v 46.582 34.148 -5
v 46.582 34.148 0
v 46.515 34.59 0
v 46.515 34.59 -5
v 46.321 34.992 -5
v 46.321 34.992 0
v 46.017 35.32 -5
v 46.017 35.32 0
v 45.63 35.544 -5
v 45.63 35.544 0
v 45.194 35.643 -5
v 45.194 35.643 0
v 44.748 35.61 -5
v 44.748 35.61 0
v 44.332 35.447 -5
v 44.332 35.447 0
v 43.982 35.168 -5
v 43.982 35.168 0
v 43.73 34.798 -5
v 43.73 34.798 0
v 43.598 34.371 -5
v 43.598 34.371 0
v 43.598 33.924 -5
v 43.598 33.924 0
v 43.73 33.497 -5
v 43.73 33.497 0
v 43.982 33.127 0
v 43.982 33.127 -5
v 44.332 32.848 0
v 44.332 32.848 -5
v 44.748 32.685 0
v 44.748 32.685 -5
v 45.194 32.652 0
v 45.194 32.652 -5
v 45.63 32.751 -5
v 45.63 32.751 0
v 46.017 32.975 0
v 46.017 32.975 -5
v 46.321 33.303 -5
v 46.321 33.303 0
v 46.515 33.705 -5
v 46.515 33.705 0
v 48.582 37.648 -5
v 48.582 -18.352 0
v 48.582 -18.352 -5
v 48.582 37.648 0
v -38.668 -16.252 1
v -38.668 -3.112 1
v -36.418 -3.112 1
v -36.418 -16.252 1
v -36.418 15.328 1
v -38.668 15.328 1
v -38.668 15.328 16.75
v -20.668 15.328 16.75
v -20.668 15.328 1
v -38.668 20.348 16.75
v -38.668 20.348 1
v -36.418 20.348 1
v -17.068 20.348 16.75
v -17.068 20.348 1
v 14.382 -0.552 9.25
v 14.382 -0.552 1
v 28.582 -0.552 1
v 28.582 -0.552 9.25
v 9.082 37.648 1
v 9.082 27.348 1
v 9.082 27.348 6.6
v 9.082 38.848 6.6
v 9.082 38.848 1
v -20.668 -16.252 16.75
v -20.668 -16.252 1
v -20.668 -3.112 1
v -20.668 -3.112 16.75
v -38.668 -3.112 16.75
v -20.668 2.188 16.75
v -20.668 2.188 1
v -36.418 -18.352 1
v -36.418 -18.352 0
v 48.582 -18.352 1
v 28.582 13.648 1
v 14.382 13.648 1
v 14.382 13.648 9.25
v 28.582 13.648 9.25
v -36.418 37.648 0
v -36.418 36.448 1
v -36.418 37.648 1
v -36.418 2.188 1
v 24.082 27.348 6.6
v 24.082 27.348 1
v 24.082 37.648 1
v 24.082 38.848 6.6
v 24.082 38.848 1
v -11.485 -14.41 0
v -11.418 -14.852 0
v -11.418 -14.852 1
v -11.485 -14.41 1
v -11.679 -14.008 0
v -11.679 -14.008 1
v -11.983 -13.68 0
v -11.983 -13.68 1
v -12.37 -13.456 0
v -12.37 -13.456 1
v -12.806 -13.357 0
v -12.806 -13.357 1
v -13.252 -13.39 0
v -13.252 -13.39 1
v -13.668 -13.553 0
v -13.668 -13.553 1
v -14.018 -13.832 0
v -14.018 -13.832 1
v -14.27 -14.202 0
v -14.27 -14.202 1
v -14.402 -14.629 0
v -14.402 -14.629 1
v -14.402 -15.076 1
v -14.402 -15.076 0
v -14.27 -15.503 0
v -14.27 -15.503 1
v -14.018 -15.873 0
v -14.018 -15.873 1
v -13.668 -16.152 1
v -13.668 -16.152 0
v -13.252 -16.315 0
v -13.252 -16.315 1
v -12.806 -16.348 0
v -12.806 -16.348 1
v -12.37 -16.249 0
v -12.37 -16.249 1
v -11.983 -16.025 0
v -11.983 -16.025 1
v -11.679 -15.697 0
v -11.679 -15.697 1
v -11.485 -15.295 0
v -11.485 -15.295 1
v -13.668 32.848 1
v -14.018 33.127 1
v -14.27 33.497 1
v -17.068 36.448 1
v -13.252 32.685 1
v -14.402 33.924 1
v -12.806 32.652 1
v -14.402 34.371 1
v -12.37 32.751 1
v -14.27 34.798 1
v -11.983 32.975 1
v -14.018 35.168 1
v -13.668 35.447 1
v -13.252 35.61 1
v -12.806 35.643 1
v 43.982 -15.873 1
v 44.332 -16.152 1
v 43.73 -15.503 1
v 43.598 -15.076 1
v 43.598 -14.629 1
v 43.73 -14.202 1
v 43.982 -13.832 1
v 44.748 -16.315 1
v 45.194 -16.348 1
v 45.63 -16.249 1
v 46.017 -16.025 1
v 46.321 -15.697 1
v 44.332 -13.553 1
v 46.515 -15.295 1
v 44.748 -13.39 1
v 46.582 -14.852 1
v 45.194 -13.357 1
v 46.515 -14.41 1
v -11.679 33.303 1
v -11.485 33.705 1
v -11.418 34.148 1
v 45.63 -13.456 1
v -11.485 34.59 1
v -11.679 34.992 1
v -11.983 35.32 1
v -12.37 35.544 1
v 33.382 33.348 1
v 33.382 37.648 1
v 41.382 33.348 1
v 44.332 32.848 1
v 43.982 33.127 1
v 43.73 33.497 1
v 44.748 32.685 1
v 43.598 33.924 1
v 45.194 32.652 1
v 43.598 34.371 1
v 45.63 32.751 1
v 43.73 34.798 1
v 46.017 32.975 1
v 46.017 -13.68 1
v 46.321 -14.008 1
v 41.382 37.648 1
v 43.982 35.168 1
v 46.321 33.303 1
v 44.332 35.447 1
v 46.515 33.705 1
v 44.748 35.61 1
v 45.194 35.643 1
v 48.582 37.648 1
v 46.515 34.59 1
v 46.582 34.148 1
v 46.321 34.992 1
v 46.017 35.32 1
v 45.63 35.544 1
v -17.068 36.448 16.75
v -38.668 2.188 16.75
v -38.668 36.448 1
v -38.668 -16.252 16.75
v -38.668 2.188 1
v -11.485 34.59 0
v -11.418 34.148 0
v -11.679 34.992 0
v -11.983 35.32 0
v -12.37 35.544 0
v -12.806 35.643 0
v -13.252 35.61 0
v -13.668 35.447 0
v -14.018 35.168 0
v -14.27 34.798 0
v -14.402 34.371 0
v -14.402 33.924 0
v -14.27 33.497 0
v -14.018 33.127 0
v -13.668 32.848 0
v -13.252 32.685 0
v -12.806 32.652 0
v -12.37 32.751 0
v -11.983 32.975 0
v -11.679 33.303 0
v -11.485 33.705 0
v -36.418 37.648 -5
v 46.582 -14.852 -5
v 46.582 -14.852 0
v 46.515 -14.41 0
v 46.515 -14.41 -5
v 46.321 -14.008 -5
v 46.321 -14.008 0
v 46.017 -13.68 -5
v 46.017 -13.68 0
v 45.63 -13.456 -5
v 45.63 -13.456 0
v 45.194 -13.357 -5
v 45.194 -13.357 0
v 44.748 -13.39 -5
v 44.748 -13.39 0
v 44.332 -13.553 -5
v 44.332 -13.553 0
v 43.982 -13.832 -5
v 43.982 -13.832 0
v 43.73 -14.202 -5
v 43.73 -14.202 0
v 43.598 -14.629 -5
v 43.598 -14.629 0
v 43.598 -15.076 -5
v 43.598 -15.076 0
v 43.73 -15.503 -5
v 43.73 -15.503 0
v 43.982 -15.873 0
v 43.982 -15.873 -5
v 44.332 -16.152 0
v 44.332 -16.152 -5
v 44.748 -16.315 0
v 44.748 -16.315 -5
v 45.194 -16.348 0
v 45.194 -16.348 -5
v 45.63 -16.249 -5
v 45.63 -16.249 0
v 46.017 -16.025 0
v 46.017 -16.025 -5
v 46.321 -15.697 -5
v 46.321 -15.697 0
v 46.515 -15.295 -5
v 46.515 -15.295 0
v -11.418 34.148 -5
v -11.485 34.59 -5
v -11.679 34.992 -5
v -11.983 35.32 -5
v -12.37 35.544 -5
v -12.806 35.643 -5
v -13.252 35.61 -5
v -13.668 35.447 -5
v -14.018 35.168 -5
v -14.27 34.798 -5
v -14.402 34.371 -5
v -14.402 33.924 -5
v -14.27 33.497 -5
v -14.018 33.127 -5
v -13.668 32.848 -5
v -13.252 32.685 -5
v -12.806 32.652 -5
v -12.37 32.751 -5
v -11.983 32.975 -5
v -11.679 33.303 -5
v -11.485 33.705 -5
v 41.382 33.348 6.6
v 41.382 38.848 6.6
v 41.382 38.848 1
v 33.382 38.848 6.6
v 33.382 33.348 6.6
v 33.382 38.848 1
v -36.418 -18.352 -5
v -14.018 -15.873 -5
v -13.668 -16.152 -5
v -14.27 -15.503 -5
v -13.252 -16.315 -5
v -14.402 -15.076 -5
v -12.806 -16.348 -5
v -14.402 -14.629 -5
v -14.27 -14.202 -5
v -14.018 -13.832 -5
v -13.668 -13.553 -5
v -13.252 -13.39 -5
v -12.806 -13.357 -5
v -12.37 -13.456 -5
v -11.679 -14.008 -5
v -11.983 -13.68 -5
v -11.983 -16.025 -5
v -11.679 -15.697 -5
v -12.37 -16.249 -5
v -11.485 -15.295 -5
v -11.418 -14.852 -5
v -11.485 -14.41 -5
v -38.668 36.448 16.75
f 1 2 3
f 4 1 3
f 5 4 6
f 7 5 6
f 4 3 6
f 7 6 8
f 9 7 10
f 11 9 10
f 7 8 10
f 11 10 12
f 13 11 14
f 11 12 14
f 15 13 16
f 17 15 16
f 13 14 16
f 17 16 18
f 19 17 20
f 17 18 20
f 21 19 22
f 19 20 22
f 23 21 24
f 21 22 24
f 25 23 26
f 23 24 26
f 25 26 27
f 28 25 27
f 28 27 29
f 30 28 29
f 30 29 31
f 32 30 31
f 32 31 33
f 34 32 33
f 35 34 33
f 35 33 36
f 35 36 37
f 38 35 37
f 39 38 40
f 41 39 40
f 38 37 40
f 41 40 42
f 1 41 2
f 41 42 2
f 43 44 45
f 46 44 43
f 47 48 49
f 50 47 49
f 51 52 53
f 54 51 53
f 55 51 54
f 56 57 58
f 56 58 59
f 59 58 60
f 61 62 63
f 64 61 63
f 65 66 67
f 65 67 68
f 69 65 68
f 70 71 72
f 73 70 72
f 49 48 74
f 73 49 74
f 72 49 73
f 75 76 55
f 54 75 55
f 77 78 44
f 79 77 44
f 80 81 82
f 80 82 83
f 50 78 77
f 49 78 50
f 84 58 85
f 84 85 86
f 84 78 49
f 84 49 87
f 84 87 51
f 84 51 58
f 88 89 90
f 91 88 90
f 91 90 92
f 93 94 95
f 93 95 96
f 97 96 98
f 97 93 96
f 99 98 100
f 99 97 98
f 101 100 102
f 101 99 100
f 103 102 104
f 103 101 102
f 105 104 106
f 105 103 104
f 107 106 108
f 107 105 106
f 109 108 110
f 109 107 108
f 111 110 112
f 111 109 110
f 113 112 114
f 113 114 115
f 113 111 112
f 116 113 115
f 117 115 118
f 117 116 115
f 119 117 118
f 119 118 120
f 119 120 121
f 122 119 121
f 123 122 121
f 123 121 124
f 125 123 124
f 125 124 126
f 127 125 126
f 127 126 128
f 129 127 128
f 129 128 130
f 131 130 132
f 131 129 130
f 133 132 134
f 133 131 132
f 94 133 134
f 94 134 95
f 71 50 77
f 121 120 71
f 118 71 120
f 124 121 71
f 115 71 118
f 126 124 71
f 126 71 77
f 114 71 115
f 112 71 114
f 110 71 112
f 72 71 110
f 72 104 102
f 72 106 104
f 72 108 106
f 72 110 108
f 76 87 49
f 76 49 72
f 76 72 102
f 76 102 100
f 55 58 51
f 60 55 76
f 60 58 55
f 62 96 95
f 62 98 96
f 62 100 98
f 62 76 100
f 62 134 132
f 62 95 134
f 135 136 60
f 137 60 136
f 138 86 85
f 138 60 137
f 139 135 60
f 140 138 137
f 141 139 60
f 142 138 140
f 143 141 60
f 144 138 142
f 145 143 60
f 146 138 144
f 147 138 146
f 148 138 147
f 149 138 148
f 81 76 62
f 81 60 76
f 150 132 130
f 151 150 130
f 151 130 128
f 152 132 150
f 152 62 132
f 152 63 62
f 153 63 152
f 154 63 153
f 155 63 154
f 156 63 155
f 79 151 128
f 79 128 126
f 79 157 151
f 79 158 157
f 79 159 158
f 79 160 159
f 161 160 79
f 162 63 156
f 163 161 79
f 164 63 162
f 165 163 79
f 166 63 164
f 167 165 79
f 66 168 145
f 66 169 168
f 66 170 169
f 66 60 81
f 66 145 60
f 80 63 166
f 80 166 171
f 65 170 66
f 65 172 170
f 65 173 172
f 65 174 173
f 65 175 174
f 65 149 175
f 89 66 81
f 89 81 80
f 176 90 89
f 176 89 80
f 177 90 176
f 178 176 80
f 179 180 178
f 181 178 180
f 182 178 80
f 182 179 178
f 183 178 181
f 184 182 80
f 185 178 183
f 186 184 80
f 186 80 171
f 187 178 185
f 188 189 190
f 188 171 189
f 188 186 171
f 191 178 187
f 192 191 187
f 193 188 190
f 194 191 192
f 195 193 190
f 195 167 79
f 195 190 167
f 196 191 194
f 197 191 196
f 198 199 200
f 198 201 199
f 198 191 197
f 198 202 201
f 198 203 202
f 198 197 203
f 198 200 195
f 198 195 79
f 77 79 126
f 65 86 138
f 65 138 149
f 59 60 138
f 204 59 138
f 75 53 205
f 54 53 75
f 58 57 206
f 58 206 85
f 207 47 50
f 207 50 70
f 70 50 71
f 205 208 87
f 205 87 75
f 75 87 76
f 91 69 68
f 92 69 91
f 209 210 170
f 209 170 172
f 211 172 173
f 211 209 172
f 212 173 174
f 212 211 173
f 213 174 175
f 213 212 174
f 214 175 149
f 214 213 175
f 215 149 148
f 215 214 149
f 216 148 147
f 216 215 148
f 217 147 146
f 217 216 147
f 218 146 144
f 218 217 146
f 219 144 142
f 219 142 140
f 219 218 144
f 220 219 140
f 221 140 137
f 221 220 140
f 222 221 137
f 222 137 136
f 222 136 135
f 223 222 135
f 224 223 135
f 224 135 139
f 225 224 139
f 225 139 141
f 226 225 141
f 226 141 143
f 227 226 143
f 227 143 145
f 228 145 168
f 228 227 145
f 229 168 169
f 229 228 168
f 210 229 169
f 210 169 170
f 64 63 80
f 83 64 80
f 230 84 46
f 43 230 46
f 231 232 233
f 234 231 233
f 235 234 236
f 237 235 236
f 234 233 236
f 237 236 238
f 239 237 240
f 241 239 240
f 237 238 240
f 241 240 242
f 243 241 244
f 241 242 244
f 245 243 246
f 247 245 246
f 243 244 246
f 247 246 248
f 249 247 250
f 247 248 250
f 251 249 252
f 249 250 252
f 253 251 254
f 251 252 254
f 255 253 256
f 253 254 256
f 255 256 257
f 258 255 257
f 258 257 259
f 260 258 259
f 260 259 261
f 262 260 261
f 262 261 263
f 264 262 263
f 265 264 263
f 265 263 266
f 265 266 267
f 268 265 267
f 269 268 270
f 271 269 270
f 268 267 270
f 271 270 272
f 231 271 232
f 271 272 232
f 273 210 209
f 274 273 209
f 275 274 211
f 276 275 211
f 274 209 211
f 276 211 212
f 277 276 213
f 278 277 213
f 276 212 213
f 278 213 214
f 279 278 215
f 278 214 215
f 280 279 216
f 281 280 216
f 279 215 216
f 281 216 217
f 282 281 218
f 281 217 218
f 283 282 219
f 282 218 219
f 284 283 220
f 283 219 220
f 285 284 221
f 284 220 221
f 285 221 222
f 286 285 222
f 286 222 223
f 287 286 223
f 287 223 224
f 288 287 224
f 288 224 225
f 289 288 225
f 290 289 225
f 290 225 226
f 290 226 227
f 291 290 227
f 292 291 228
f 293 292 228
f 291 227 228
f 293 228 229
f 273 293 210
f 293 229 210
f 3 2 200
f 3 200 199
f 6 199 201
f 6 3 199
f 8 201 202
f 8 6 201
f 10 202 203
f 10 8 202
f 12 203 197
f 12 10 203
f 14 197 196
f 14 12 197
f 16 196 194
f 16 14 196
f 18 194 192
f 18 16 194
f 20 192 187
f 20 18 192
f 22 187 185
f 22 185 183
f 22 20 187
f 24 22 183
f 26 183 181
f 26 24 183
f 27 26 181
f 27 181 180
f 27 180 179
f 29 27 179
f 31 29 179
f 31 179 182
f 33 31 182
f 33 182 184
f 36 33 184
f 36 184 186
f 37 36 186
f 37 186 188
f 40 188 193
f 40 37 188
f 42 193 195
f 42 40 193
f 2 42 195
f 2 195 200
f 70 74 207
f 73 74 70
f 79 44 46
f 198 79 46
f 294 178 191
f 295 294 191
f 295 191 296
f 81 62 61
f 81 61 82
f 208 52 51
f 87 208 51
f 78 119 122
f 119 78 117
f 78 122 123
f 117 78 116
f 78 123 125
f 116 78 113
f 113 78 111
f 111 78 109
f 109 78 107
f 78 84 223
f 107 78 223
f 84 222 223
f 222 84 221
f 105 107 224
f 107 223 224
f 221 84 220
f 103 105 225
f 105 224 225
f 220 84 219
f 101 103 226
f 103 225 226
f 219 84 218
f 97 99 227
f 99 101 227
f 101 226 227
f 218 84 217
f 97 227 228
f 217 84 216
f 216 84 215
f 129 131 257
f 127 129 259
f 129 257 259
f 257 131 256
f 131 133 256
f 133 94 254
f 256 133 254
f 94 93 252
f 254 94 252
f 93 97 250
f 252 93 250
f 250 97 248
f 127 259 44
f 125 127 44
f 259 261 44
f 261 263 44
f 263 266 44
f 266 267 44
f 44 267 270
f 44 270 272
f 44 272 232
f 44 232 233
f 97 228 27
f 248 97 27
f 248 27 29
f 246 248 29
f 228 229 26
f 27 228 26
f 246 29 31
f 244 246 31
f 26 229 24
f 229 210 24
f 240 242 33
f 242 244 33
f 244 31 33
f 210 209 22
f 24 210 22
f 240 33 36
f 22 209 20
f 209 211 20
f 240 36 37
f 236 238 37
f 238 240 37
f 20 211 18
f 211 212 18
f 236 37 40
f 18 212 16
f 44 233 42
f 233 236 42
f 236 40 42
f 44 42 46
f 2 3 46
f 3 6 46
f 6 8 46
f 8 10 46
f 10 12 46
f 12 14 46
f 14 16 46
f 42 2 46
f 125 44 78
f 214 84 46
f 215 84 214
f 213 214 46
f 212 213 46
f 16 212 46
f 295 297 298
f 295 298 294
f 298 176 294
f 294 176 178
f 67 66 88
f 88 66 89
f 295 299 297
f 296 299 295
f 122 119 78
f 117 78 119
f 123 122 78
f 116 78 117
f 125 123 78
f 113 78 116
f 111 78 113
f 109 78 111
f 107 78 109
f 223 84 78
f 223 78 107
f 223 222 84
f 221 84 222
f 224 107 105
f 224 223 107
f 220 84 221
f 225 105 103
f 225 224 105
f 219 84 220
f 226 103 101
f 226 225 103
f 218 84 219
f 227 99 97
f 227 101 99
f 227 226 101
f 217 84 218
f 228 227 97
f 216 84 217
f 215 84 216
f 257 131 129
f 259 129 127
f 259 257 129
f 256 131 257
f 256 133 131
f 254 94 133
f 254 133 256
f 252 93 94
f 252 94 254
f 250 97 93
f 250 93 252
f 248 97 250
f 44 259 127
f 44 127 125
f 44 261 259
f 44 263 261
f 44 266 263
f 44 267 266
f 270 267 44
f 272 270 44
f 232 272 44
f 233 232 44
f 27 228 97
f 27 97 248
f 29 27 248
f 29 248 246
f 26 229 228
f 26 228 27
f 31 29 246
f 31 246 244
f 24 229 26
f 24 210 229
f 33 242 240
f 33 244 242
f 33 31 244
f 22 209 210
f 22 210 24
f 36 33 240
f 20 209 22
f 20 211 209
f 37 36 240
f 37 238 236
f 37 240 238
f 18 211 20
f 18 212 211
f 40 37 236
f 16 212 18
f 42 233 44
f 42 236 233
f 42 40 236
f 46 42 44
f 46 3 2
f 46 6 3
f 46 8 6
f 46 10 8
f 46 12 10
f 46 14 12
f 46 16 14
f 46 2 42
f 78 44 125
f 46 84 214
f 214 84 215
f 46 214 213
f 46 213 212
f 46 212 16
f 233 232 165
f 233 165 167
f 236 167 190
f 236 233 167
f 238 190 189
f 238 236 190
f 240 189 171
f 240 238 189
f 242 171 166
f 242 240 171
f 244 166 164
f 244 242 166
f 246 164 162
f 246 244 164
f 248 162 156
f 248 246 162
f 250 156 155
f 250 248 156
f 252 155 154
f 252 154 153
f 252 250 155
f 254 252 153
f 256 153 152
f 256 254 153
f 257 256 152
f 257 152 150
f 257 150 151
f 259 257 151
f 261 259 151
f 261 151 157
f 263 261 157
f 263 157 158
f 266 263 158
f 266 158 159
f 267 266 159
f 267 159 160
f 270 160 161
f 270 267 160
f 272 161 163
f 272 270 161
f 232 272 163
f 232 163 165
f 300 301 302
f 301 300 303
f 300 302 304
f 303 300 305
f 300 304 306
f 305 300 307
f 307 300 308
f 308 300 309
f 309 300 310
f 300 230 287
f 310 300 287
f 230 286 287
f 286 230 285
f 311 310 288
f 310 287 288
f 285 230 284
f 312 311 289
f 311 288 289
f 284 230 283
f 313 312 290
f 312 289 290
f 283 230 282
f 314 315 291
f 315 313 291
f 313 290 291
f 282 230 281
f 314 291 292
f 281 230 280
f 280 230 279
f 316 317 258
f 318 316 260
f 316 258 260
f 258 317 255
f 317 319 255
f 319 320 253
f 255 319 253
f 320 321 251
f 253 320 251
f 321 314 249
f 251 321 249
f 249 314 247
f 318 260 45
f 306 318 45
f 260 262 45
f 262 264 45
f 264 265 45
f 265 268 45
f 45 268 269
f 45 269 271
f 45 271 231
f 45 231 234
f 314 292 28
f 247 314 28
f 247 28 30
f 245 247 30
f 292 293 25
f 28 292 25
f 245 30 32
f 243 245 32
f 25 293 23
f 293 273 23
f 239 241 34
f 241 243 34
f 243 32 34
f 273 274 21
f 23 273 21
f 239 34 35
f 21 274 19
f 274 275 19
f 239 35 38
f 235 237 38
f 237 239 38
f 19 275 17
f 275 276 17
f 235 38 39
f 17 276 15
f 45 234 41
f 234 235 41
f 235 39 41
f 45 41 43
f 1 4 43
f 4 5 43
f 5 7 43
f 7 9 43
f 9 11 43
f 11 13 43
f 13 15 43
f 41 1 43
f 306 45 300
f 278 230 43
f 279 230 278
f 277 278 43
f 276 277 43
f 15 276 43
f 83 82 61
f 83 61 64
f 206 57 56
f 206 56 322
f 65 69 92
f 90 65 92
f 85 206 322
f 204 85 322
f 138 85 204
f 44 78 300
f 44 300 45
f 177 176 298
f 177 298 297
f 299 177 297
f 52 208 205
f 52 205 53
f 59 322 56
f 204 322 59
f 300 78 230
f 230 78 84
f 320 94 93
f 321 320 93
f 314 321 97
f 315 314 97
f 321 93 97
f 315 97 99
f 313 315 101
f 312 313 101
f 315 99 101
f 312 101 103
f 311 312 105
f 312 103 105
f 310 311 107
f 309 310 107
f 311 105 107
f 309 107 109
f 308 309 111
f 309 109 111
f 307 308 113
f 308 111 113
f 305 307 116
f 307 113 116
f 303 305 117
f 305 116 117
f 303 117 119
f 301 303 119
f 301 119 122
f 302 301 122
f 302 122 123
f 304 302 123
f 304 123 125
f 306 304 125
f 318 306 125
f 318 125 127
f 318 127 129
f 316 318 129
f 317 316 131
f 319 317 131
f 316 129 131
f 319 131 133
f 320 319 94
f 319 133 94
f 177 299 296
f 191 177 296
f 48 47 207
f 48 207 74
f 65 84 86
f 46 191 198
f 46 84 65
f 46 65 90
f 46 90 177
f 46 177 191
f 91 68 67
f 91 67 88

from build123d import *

# Parameters (mm, degrees)
SKETCH1_W           = 85
SKETCH1_H           = 56
SKETCH1_R           = 1.5
BOSS_EXTRUDE1_DEPTH = 1
SKETCH1_2_W         = 85
SKETCH1_2_H         = 56
SKETCH1_2_R         = 1.5
BOSS_EXTRUDE2_DEPTH = 5
SKETCH3_W           = 14.2
SKETCH3_H           = 14.2
BOSS_EXTRUDE3_DEPTH = 8.25
SKETCH4_W           = 18
SKETCH4_H           = 13.14
SKETCH4_W_2         = 21.6
SKETCH4_H_2         = 16.1
BOSS_EXTRUDE4_DEPTH = 15.75
SKETCH5_W           = 15
SKETCH5_H           = 11.5
SKETCH5_W_2         = 8
SKETCH5_H_2         = 5.5
BOSS_EXTRUDE5_DEPTH = 5.6


with BuildPart() as part:
    # Sketch1 → Boss-Extrude1 (new body)
    with BuildSketch(Plane.XY):
        with Locations((6.081574074, 9.647501164)):
            Rectangle(SKETCH1_W, SKETCH1_H)
        with Locations((-12.918426004, 34.147501164)):
            Circle(SKETCH1_R, mode=Mode.SUBTRACT)
        with Locations((-12.918426004, -14.852498836)):
            Circle(SKETCH1_R, mode=Mode.SUBTRACT)
        with Locations((45.081574074, 34.147501164)):
            Circle(SKETCH1_R, mode=Mode.SUBTRACT)
        with Locations((45.081574074, -14.852498836)):
            Circle(SKETCH1_R, mode=Mode.SUBTRACT)
    extrude(amount=BOSS_EXTRUDE1_DEPTH)

    # Sketch3 → Boss-Extrude3 (add)
    with BuildSketch(Plane.XY.offset(1)):
        with Locations((21.481574074, 6.547501164)):
            Rectangle(SKETCH3_W, SKETCH3_H)
    extrude(amount=BOSS_EXTRUDE3_DEPTH)

    # Sketch4 → Boss-Extrude4 (add)
    with BuildSketch(Plane.XY.offset(1)):
        with Locations((-29.667902016, 8.757501164)):
            Rectangle(SKETCH4_W, SKETCH4_H)
        with Locations((-29.667902016, -9.682498836)):
            Rectangle(SKETCH4_W, SKETCH4_H)
        with Locations((-27.867902016, 28.397501164)):
            Rectangle(SKETCH4_W_2, SKETCH4_H_2)
    extrude(amount=BOSS_EXTRUDE4_DEPTH)

    # Sketch5 → Boss-Extrude5 (add)
    with BuildSketch(Plane.XY.offset(1)):
        with Locations((16.581574074, 33.097501164)):
            Rectangle(SKETCH5_W, SKETCH5_H)
        with Locations((37.381574074, 36.097501164)):
            Rectangle(SKETCH5_W_2, SKETCH5_H_2)
    extrude(amount=BOSS_EXTRUDE5_DEPTH)


with BuildPart() as body_2:
    # Sketch1<2> → Boss-Extrude2 (new body)
    with BuildSketch(Plane.XY):
        with Locations((6.081574074, 9.647501164)):
            Rectangle(SKETCH1_2_W, SKETCH1_2_H)
        with Locations((-12.918426004, 34.147501164)):
            Circle(SKETCH1_2_R, mode=Mode.SUBTRACT)
        with Locations((-12.918426004, -14.852498836)):
            Circle(SKETCH1_2_R, mode=Mode.SUBTRACT)
        with Locations((45.081574074, 34.147501164)):
            Circle(SKETCH1_2_R, mode=Mode.SUBTRACT)
        with Locations((45.081574074, -14.852498836)):
            Circle(SKETCH1_2_R, mode=Mode.SUBTRACT)
    extrude(amount=-BOSS_EXTRUDE2_DEPTH)


solid = Compound([part.part, body_2.part])
